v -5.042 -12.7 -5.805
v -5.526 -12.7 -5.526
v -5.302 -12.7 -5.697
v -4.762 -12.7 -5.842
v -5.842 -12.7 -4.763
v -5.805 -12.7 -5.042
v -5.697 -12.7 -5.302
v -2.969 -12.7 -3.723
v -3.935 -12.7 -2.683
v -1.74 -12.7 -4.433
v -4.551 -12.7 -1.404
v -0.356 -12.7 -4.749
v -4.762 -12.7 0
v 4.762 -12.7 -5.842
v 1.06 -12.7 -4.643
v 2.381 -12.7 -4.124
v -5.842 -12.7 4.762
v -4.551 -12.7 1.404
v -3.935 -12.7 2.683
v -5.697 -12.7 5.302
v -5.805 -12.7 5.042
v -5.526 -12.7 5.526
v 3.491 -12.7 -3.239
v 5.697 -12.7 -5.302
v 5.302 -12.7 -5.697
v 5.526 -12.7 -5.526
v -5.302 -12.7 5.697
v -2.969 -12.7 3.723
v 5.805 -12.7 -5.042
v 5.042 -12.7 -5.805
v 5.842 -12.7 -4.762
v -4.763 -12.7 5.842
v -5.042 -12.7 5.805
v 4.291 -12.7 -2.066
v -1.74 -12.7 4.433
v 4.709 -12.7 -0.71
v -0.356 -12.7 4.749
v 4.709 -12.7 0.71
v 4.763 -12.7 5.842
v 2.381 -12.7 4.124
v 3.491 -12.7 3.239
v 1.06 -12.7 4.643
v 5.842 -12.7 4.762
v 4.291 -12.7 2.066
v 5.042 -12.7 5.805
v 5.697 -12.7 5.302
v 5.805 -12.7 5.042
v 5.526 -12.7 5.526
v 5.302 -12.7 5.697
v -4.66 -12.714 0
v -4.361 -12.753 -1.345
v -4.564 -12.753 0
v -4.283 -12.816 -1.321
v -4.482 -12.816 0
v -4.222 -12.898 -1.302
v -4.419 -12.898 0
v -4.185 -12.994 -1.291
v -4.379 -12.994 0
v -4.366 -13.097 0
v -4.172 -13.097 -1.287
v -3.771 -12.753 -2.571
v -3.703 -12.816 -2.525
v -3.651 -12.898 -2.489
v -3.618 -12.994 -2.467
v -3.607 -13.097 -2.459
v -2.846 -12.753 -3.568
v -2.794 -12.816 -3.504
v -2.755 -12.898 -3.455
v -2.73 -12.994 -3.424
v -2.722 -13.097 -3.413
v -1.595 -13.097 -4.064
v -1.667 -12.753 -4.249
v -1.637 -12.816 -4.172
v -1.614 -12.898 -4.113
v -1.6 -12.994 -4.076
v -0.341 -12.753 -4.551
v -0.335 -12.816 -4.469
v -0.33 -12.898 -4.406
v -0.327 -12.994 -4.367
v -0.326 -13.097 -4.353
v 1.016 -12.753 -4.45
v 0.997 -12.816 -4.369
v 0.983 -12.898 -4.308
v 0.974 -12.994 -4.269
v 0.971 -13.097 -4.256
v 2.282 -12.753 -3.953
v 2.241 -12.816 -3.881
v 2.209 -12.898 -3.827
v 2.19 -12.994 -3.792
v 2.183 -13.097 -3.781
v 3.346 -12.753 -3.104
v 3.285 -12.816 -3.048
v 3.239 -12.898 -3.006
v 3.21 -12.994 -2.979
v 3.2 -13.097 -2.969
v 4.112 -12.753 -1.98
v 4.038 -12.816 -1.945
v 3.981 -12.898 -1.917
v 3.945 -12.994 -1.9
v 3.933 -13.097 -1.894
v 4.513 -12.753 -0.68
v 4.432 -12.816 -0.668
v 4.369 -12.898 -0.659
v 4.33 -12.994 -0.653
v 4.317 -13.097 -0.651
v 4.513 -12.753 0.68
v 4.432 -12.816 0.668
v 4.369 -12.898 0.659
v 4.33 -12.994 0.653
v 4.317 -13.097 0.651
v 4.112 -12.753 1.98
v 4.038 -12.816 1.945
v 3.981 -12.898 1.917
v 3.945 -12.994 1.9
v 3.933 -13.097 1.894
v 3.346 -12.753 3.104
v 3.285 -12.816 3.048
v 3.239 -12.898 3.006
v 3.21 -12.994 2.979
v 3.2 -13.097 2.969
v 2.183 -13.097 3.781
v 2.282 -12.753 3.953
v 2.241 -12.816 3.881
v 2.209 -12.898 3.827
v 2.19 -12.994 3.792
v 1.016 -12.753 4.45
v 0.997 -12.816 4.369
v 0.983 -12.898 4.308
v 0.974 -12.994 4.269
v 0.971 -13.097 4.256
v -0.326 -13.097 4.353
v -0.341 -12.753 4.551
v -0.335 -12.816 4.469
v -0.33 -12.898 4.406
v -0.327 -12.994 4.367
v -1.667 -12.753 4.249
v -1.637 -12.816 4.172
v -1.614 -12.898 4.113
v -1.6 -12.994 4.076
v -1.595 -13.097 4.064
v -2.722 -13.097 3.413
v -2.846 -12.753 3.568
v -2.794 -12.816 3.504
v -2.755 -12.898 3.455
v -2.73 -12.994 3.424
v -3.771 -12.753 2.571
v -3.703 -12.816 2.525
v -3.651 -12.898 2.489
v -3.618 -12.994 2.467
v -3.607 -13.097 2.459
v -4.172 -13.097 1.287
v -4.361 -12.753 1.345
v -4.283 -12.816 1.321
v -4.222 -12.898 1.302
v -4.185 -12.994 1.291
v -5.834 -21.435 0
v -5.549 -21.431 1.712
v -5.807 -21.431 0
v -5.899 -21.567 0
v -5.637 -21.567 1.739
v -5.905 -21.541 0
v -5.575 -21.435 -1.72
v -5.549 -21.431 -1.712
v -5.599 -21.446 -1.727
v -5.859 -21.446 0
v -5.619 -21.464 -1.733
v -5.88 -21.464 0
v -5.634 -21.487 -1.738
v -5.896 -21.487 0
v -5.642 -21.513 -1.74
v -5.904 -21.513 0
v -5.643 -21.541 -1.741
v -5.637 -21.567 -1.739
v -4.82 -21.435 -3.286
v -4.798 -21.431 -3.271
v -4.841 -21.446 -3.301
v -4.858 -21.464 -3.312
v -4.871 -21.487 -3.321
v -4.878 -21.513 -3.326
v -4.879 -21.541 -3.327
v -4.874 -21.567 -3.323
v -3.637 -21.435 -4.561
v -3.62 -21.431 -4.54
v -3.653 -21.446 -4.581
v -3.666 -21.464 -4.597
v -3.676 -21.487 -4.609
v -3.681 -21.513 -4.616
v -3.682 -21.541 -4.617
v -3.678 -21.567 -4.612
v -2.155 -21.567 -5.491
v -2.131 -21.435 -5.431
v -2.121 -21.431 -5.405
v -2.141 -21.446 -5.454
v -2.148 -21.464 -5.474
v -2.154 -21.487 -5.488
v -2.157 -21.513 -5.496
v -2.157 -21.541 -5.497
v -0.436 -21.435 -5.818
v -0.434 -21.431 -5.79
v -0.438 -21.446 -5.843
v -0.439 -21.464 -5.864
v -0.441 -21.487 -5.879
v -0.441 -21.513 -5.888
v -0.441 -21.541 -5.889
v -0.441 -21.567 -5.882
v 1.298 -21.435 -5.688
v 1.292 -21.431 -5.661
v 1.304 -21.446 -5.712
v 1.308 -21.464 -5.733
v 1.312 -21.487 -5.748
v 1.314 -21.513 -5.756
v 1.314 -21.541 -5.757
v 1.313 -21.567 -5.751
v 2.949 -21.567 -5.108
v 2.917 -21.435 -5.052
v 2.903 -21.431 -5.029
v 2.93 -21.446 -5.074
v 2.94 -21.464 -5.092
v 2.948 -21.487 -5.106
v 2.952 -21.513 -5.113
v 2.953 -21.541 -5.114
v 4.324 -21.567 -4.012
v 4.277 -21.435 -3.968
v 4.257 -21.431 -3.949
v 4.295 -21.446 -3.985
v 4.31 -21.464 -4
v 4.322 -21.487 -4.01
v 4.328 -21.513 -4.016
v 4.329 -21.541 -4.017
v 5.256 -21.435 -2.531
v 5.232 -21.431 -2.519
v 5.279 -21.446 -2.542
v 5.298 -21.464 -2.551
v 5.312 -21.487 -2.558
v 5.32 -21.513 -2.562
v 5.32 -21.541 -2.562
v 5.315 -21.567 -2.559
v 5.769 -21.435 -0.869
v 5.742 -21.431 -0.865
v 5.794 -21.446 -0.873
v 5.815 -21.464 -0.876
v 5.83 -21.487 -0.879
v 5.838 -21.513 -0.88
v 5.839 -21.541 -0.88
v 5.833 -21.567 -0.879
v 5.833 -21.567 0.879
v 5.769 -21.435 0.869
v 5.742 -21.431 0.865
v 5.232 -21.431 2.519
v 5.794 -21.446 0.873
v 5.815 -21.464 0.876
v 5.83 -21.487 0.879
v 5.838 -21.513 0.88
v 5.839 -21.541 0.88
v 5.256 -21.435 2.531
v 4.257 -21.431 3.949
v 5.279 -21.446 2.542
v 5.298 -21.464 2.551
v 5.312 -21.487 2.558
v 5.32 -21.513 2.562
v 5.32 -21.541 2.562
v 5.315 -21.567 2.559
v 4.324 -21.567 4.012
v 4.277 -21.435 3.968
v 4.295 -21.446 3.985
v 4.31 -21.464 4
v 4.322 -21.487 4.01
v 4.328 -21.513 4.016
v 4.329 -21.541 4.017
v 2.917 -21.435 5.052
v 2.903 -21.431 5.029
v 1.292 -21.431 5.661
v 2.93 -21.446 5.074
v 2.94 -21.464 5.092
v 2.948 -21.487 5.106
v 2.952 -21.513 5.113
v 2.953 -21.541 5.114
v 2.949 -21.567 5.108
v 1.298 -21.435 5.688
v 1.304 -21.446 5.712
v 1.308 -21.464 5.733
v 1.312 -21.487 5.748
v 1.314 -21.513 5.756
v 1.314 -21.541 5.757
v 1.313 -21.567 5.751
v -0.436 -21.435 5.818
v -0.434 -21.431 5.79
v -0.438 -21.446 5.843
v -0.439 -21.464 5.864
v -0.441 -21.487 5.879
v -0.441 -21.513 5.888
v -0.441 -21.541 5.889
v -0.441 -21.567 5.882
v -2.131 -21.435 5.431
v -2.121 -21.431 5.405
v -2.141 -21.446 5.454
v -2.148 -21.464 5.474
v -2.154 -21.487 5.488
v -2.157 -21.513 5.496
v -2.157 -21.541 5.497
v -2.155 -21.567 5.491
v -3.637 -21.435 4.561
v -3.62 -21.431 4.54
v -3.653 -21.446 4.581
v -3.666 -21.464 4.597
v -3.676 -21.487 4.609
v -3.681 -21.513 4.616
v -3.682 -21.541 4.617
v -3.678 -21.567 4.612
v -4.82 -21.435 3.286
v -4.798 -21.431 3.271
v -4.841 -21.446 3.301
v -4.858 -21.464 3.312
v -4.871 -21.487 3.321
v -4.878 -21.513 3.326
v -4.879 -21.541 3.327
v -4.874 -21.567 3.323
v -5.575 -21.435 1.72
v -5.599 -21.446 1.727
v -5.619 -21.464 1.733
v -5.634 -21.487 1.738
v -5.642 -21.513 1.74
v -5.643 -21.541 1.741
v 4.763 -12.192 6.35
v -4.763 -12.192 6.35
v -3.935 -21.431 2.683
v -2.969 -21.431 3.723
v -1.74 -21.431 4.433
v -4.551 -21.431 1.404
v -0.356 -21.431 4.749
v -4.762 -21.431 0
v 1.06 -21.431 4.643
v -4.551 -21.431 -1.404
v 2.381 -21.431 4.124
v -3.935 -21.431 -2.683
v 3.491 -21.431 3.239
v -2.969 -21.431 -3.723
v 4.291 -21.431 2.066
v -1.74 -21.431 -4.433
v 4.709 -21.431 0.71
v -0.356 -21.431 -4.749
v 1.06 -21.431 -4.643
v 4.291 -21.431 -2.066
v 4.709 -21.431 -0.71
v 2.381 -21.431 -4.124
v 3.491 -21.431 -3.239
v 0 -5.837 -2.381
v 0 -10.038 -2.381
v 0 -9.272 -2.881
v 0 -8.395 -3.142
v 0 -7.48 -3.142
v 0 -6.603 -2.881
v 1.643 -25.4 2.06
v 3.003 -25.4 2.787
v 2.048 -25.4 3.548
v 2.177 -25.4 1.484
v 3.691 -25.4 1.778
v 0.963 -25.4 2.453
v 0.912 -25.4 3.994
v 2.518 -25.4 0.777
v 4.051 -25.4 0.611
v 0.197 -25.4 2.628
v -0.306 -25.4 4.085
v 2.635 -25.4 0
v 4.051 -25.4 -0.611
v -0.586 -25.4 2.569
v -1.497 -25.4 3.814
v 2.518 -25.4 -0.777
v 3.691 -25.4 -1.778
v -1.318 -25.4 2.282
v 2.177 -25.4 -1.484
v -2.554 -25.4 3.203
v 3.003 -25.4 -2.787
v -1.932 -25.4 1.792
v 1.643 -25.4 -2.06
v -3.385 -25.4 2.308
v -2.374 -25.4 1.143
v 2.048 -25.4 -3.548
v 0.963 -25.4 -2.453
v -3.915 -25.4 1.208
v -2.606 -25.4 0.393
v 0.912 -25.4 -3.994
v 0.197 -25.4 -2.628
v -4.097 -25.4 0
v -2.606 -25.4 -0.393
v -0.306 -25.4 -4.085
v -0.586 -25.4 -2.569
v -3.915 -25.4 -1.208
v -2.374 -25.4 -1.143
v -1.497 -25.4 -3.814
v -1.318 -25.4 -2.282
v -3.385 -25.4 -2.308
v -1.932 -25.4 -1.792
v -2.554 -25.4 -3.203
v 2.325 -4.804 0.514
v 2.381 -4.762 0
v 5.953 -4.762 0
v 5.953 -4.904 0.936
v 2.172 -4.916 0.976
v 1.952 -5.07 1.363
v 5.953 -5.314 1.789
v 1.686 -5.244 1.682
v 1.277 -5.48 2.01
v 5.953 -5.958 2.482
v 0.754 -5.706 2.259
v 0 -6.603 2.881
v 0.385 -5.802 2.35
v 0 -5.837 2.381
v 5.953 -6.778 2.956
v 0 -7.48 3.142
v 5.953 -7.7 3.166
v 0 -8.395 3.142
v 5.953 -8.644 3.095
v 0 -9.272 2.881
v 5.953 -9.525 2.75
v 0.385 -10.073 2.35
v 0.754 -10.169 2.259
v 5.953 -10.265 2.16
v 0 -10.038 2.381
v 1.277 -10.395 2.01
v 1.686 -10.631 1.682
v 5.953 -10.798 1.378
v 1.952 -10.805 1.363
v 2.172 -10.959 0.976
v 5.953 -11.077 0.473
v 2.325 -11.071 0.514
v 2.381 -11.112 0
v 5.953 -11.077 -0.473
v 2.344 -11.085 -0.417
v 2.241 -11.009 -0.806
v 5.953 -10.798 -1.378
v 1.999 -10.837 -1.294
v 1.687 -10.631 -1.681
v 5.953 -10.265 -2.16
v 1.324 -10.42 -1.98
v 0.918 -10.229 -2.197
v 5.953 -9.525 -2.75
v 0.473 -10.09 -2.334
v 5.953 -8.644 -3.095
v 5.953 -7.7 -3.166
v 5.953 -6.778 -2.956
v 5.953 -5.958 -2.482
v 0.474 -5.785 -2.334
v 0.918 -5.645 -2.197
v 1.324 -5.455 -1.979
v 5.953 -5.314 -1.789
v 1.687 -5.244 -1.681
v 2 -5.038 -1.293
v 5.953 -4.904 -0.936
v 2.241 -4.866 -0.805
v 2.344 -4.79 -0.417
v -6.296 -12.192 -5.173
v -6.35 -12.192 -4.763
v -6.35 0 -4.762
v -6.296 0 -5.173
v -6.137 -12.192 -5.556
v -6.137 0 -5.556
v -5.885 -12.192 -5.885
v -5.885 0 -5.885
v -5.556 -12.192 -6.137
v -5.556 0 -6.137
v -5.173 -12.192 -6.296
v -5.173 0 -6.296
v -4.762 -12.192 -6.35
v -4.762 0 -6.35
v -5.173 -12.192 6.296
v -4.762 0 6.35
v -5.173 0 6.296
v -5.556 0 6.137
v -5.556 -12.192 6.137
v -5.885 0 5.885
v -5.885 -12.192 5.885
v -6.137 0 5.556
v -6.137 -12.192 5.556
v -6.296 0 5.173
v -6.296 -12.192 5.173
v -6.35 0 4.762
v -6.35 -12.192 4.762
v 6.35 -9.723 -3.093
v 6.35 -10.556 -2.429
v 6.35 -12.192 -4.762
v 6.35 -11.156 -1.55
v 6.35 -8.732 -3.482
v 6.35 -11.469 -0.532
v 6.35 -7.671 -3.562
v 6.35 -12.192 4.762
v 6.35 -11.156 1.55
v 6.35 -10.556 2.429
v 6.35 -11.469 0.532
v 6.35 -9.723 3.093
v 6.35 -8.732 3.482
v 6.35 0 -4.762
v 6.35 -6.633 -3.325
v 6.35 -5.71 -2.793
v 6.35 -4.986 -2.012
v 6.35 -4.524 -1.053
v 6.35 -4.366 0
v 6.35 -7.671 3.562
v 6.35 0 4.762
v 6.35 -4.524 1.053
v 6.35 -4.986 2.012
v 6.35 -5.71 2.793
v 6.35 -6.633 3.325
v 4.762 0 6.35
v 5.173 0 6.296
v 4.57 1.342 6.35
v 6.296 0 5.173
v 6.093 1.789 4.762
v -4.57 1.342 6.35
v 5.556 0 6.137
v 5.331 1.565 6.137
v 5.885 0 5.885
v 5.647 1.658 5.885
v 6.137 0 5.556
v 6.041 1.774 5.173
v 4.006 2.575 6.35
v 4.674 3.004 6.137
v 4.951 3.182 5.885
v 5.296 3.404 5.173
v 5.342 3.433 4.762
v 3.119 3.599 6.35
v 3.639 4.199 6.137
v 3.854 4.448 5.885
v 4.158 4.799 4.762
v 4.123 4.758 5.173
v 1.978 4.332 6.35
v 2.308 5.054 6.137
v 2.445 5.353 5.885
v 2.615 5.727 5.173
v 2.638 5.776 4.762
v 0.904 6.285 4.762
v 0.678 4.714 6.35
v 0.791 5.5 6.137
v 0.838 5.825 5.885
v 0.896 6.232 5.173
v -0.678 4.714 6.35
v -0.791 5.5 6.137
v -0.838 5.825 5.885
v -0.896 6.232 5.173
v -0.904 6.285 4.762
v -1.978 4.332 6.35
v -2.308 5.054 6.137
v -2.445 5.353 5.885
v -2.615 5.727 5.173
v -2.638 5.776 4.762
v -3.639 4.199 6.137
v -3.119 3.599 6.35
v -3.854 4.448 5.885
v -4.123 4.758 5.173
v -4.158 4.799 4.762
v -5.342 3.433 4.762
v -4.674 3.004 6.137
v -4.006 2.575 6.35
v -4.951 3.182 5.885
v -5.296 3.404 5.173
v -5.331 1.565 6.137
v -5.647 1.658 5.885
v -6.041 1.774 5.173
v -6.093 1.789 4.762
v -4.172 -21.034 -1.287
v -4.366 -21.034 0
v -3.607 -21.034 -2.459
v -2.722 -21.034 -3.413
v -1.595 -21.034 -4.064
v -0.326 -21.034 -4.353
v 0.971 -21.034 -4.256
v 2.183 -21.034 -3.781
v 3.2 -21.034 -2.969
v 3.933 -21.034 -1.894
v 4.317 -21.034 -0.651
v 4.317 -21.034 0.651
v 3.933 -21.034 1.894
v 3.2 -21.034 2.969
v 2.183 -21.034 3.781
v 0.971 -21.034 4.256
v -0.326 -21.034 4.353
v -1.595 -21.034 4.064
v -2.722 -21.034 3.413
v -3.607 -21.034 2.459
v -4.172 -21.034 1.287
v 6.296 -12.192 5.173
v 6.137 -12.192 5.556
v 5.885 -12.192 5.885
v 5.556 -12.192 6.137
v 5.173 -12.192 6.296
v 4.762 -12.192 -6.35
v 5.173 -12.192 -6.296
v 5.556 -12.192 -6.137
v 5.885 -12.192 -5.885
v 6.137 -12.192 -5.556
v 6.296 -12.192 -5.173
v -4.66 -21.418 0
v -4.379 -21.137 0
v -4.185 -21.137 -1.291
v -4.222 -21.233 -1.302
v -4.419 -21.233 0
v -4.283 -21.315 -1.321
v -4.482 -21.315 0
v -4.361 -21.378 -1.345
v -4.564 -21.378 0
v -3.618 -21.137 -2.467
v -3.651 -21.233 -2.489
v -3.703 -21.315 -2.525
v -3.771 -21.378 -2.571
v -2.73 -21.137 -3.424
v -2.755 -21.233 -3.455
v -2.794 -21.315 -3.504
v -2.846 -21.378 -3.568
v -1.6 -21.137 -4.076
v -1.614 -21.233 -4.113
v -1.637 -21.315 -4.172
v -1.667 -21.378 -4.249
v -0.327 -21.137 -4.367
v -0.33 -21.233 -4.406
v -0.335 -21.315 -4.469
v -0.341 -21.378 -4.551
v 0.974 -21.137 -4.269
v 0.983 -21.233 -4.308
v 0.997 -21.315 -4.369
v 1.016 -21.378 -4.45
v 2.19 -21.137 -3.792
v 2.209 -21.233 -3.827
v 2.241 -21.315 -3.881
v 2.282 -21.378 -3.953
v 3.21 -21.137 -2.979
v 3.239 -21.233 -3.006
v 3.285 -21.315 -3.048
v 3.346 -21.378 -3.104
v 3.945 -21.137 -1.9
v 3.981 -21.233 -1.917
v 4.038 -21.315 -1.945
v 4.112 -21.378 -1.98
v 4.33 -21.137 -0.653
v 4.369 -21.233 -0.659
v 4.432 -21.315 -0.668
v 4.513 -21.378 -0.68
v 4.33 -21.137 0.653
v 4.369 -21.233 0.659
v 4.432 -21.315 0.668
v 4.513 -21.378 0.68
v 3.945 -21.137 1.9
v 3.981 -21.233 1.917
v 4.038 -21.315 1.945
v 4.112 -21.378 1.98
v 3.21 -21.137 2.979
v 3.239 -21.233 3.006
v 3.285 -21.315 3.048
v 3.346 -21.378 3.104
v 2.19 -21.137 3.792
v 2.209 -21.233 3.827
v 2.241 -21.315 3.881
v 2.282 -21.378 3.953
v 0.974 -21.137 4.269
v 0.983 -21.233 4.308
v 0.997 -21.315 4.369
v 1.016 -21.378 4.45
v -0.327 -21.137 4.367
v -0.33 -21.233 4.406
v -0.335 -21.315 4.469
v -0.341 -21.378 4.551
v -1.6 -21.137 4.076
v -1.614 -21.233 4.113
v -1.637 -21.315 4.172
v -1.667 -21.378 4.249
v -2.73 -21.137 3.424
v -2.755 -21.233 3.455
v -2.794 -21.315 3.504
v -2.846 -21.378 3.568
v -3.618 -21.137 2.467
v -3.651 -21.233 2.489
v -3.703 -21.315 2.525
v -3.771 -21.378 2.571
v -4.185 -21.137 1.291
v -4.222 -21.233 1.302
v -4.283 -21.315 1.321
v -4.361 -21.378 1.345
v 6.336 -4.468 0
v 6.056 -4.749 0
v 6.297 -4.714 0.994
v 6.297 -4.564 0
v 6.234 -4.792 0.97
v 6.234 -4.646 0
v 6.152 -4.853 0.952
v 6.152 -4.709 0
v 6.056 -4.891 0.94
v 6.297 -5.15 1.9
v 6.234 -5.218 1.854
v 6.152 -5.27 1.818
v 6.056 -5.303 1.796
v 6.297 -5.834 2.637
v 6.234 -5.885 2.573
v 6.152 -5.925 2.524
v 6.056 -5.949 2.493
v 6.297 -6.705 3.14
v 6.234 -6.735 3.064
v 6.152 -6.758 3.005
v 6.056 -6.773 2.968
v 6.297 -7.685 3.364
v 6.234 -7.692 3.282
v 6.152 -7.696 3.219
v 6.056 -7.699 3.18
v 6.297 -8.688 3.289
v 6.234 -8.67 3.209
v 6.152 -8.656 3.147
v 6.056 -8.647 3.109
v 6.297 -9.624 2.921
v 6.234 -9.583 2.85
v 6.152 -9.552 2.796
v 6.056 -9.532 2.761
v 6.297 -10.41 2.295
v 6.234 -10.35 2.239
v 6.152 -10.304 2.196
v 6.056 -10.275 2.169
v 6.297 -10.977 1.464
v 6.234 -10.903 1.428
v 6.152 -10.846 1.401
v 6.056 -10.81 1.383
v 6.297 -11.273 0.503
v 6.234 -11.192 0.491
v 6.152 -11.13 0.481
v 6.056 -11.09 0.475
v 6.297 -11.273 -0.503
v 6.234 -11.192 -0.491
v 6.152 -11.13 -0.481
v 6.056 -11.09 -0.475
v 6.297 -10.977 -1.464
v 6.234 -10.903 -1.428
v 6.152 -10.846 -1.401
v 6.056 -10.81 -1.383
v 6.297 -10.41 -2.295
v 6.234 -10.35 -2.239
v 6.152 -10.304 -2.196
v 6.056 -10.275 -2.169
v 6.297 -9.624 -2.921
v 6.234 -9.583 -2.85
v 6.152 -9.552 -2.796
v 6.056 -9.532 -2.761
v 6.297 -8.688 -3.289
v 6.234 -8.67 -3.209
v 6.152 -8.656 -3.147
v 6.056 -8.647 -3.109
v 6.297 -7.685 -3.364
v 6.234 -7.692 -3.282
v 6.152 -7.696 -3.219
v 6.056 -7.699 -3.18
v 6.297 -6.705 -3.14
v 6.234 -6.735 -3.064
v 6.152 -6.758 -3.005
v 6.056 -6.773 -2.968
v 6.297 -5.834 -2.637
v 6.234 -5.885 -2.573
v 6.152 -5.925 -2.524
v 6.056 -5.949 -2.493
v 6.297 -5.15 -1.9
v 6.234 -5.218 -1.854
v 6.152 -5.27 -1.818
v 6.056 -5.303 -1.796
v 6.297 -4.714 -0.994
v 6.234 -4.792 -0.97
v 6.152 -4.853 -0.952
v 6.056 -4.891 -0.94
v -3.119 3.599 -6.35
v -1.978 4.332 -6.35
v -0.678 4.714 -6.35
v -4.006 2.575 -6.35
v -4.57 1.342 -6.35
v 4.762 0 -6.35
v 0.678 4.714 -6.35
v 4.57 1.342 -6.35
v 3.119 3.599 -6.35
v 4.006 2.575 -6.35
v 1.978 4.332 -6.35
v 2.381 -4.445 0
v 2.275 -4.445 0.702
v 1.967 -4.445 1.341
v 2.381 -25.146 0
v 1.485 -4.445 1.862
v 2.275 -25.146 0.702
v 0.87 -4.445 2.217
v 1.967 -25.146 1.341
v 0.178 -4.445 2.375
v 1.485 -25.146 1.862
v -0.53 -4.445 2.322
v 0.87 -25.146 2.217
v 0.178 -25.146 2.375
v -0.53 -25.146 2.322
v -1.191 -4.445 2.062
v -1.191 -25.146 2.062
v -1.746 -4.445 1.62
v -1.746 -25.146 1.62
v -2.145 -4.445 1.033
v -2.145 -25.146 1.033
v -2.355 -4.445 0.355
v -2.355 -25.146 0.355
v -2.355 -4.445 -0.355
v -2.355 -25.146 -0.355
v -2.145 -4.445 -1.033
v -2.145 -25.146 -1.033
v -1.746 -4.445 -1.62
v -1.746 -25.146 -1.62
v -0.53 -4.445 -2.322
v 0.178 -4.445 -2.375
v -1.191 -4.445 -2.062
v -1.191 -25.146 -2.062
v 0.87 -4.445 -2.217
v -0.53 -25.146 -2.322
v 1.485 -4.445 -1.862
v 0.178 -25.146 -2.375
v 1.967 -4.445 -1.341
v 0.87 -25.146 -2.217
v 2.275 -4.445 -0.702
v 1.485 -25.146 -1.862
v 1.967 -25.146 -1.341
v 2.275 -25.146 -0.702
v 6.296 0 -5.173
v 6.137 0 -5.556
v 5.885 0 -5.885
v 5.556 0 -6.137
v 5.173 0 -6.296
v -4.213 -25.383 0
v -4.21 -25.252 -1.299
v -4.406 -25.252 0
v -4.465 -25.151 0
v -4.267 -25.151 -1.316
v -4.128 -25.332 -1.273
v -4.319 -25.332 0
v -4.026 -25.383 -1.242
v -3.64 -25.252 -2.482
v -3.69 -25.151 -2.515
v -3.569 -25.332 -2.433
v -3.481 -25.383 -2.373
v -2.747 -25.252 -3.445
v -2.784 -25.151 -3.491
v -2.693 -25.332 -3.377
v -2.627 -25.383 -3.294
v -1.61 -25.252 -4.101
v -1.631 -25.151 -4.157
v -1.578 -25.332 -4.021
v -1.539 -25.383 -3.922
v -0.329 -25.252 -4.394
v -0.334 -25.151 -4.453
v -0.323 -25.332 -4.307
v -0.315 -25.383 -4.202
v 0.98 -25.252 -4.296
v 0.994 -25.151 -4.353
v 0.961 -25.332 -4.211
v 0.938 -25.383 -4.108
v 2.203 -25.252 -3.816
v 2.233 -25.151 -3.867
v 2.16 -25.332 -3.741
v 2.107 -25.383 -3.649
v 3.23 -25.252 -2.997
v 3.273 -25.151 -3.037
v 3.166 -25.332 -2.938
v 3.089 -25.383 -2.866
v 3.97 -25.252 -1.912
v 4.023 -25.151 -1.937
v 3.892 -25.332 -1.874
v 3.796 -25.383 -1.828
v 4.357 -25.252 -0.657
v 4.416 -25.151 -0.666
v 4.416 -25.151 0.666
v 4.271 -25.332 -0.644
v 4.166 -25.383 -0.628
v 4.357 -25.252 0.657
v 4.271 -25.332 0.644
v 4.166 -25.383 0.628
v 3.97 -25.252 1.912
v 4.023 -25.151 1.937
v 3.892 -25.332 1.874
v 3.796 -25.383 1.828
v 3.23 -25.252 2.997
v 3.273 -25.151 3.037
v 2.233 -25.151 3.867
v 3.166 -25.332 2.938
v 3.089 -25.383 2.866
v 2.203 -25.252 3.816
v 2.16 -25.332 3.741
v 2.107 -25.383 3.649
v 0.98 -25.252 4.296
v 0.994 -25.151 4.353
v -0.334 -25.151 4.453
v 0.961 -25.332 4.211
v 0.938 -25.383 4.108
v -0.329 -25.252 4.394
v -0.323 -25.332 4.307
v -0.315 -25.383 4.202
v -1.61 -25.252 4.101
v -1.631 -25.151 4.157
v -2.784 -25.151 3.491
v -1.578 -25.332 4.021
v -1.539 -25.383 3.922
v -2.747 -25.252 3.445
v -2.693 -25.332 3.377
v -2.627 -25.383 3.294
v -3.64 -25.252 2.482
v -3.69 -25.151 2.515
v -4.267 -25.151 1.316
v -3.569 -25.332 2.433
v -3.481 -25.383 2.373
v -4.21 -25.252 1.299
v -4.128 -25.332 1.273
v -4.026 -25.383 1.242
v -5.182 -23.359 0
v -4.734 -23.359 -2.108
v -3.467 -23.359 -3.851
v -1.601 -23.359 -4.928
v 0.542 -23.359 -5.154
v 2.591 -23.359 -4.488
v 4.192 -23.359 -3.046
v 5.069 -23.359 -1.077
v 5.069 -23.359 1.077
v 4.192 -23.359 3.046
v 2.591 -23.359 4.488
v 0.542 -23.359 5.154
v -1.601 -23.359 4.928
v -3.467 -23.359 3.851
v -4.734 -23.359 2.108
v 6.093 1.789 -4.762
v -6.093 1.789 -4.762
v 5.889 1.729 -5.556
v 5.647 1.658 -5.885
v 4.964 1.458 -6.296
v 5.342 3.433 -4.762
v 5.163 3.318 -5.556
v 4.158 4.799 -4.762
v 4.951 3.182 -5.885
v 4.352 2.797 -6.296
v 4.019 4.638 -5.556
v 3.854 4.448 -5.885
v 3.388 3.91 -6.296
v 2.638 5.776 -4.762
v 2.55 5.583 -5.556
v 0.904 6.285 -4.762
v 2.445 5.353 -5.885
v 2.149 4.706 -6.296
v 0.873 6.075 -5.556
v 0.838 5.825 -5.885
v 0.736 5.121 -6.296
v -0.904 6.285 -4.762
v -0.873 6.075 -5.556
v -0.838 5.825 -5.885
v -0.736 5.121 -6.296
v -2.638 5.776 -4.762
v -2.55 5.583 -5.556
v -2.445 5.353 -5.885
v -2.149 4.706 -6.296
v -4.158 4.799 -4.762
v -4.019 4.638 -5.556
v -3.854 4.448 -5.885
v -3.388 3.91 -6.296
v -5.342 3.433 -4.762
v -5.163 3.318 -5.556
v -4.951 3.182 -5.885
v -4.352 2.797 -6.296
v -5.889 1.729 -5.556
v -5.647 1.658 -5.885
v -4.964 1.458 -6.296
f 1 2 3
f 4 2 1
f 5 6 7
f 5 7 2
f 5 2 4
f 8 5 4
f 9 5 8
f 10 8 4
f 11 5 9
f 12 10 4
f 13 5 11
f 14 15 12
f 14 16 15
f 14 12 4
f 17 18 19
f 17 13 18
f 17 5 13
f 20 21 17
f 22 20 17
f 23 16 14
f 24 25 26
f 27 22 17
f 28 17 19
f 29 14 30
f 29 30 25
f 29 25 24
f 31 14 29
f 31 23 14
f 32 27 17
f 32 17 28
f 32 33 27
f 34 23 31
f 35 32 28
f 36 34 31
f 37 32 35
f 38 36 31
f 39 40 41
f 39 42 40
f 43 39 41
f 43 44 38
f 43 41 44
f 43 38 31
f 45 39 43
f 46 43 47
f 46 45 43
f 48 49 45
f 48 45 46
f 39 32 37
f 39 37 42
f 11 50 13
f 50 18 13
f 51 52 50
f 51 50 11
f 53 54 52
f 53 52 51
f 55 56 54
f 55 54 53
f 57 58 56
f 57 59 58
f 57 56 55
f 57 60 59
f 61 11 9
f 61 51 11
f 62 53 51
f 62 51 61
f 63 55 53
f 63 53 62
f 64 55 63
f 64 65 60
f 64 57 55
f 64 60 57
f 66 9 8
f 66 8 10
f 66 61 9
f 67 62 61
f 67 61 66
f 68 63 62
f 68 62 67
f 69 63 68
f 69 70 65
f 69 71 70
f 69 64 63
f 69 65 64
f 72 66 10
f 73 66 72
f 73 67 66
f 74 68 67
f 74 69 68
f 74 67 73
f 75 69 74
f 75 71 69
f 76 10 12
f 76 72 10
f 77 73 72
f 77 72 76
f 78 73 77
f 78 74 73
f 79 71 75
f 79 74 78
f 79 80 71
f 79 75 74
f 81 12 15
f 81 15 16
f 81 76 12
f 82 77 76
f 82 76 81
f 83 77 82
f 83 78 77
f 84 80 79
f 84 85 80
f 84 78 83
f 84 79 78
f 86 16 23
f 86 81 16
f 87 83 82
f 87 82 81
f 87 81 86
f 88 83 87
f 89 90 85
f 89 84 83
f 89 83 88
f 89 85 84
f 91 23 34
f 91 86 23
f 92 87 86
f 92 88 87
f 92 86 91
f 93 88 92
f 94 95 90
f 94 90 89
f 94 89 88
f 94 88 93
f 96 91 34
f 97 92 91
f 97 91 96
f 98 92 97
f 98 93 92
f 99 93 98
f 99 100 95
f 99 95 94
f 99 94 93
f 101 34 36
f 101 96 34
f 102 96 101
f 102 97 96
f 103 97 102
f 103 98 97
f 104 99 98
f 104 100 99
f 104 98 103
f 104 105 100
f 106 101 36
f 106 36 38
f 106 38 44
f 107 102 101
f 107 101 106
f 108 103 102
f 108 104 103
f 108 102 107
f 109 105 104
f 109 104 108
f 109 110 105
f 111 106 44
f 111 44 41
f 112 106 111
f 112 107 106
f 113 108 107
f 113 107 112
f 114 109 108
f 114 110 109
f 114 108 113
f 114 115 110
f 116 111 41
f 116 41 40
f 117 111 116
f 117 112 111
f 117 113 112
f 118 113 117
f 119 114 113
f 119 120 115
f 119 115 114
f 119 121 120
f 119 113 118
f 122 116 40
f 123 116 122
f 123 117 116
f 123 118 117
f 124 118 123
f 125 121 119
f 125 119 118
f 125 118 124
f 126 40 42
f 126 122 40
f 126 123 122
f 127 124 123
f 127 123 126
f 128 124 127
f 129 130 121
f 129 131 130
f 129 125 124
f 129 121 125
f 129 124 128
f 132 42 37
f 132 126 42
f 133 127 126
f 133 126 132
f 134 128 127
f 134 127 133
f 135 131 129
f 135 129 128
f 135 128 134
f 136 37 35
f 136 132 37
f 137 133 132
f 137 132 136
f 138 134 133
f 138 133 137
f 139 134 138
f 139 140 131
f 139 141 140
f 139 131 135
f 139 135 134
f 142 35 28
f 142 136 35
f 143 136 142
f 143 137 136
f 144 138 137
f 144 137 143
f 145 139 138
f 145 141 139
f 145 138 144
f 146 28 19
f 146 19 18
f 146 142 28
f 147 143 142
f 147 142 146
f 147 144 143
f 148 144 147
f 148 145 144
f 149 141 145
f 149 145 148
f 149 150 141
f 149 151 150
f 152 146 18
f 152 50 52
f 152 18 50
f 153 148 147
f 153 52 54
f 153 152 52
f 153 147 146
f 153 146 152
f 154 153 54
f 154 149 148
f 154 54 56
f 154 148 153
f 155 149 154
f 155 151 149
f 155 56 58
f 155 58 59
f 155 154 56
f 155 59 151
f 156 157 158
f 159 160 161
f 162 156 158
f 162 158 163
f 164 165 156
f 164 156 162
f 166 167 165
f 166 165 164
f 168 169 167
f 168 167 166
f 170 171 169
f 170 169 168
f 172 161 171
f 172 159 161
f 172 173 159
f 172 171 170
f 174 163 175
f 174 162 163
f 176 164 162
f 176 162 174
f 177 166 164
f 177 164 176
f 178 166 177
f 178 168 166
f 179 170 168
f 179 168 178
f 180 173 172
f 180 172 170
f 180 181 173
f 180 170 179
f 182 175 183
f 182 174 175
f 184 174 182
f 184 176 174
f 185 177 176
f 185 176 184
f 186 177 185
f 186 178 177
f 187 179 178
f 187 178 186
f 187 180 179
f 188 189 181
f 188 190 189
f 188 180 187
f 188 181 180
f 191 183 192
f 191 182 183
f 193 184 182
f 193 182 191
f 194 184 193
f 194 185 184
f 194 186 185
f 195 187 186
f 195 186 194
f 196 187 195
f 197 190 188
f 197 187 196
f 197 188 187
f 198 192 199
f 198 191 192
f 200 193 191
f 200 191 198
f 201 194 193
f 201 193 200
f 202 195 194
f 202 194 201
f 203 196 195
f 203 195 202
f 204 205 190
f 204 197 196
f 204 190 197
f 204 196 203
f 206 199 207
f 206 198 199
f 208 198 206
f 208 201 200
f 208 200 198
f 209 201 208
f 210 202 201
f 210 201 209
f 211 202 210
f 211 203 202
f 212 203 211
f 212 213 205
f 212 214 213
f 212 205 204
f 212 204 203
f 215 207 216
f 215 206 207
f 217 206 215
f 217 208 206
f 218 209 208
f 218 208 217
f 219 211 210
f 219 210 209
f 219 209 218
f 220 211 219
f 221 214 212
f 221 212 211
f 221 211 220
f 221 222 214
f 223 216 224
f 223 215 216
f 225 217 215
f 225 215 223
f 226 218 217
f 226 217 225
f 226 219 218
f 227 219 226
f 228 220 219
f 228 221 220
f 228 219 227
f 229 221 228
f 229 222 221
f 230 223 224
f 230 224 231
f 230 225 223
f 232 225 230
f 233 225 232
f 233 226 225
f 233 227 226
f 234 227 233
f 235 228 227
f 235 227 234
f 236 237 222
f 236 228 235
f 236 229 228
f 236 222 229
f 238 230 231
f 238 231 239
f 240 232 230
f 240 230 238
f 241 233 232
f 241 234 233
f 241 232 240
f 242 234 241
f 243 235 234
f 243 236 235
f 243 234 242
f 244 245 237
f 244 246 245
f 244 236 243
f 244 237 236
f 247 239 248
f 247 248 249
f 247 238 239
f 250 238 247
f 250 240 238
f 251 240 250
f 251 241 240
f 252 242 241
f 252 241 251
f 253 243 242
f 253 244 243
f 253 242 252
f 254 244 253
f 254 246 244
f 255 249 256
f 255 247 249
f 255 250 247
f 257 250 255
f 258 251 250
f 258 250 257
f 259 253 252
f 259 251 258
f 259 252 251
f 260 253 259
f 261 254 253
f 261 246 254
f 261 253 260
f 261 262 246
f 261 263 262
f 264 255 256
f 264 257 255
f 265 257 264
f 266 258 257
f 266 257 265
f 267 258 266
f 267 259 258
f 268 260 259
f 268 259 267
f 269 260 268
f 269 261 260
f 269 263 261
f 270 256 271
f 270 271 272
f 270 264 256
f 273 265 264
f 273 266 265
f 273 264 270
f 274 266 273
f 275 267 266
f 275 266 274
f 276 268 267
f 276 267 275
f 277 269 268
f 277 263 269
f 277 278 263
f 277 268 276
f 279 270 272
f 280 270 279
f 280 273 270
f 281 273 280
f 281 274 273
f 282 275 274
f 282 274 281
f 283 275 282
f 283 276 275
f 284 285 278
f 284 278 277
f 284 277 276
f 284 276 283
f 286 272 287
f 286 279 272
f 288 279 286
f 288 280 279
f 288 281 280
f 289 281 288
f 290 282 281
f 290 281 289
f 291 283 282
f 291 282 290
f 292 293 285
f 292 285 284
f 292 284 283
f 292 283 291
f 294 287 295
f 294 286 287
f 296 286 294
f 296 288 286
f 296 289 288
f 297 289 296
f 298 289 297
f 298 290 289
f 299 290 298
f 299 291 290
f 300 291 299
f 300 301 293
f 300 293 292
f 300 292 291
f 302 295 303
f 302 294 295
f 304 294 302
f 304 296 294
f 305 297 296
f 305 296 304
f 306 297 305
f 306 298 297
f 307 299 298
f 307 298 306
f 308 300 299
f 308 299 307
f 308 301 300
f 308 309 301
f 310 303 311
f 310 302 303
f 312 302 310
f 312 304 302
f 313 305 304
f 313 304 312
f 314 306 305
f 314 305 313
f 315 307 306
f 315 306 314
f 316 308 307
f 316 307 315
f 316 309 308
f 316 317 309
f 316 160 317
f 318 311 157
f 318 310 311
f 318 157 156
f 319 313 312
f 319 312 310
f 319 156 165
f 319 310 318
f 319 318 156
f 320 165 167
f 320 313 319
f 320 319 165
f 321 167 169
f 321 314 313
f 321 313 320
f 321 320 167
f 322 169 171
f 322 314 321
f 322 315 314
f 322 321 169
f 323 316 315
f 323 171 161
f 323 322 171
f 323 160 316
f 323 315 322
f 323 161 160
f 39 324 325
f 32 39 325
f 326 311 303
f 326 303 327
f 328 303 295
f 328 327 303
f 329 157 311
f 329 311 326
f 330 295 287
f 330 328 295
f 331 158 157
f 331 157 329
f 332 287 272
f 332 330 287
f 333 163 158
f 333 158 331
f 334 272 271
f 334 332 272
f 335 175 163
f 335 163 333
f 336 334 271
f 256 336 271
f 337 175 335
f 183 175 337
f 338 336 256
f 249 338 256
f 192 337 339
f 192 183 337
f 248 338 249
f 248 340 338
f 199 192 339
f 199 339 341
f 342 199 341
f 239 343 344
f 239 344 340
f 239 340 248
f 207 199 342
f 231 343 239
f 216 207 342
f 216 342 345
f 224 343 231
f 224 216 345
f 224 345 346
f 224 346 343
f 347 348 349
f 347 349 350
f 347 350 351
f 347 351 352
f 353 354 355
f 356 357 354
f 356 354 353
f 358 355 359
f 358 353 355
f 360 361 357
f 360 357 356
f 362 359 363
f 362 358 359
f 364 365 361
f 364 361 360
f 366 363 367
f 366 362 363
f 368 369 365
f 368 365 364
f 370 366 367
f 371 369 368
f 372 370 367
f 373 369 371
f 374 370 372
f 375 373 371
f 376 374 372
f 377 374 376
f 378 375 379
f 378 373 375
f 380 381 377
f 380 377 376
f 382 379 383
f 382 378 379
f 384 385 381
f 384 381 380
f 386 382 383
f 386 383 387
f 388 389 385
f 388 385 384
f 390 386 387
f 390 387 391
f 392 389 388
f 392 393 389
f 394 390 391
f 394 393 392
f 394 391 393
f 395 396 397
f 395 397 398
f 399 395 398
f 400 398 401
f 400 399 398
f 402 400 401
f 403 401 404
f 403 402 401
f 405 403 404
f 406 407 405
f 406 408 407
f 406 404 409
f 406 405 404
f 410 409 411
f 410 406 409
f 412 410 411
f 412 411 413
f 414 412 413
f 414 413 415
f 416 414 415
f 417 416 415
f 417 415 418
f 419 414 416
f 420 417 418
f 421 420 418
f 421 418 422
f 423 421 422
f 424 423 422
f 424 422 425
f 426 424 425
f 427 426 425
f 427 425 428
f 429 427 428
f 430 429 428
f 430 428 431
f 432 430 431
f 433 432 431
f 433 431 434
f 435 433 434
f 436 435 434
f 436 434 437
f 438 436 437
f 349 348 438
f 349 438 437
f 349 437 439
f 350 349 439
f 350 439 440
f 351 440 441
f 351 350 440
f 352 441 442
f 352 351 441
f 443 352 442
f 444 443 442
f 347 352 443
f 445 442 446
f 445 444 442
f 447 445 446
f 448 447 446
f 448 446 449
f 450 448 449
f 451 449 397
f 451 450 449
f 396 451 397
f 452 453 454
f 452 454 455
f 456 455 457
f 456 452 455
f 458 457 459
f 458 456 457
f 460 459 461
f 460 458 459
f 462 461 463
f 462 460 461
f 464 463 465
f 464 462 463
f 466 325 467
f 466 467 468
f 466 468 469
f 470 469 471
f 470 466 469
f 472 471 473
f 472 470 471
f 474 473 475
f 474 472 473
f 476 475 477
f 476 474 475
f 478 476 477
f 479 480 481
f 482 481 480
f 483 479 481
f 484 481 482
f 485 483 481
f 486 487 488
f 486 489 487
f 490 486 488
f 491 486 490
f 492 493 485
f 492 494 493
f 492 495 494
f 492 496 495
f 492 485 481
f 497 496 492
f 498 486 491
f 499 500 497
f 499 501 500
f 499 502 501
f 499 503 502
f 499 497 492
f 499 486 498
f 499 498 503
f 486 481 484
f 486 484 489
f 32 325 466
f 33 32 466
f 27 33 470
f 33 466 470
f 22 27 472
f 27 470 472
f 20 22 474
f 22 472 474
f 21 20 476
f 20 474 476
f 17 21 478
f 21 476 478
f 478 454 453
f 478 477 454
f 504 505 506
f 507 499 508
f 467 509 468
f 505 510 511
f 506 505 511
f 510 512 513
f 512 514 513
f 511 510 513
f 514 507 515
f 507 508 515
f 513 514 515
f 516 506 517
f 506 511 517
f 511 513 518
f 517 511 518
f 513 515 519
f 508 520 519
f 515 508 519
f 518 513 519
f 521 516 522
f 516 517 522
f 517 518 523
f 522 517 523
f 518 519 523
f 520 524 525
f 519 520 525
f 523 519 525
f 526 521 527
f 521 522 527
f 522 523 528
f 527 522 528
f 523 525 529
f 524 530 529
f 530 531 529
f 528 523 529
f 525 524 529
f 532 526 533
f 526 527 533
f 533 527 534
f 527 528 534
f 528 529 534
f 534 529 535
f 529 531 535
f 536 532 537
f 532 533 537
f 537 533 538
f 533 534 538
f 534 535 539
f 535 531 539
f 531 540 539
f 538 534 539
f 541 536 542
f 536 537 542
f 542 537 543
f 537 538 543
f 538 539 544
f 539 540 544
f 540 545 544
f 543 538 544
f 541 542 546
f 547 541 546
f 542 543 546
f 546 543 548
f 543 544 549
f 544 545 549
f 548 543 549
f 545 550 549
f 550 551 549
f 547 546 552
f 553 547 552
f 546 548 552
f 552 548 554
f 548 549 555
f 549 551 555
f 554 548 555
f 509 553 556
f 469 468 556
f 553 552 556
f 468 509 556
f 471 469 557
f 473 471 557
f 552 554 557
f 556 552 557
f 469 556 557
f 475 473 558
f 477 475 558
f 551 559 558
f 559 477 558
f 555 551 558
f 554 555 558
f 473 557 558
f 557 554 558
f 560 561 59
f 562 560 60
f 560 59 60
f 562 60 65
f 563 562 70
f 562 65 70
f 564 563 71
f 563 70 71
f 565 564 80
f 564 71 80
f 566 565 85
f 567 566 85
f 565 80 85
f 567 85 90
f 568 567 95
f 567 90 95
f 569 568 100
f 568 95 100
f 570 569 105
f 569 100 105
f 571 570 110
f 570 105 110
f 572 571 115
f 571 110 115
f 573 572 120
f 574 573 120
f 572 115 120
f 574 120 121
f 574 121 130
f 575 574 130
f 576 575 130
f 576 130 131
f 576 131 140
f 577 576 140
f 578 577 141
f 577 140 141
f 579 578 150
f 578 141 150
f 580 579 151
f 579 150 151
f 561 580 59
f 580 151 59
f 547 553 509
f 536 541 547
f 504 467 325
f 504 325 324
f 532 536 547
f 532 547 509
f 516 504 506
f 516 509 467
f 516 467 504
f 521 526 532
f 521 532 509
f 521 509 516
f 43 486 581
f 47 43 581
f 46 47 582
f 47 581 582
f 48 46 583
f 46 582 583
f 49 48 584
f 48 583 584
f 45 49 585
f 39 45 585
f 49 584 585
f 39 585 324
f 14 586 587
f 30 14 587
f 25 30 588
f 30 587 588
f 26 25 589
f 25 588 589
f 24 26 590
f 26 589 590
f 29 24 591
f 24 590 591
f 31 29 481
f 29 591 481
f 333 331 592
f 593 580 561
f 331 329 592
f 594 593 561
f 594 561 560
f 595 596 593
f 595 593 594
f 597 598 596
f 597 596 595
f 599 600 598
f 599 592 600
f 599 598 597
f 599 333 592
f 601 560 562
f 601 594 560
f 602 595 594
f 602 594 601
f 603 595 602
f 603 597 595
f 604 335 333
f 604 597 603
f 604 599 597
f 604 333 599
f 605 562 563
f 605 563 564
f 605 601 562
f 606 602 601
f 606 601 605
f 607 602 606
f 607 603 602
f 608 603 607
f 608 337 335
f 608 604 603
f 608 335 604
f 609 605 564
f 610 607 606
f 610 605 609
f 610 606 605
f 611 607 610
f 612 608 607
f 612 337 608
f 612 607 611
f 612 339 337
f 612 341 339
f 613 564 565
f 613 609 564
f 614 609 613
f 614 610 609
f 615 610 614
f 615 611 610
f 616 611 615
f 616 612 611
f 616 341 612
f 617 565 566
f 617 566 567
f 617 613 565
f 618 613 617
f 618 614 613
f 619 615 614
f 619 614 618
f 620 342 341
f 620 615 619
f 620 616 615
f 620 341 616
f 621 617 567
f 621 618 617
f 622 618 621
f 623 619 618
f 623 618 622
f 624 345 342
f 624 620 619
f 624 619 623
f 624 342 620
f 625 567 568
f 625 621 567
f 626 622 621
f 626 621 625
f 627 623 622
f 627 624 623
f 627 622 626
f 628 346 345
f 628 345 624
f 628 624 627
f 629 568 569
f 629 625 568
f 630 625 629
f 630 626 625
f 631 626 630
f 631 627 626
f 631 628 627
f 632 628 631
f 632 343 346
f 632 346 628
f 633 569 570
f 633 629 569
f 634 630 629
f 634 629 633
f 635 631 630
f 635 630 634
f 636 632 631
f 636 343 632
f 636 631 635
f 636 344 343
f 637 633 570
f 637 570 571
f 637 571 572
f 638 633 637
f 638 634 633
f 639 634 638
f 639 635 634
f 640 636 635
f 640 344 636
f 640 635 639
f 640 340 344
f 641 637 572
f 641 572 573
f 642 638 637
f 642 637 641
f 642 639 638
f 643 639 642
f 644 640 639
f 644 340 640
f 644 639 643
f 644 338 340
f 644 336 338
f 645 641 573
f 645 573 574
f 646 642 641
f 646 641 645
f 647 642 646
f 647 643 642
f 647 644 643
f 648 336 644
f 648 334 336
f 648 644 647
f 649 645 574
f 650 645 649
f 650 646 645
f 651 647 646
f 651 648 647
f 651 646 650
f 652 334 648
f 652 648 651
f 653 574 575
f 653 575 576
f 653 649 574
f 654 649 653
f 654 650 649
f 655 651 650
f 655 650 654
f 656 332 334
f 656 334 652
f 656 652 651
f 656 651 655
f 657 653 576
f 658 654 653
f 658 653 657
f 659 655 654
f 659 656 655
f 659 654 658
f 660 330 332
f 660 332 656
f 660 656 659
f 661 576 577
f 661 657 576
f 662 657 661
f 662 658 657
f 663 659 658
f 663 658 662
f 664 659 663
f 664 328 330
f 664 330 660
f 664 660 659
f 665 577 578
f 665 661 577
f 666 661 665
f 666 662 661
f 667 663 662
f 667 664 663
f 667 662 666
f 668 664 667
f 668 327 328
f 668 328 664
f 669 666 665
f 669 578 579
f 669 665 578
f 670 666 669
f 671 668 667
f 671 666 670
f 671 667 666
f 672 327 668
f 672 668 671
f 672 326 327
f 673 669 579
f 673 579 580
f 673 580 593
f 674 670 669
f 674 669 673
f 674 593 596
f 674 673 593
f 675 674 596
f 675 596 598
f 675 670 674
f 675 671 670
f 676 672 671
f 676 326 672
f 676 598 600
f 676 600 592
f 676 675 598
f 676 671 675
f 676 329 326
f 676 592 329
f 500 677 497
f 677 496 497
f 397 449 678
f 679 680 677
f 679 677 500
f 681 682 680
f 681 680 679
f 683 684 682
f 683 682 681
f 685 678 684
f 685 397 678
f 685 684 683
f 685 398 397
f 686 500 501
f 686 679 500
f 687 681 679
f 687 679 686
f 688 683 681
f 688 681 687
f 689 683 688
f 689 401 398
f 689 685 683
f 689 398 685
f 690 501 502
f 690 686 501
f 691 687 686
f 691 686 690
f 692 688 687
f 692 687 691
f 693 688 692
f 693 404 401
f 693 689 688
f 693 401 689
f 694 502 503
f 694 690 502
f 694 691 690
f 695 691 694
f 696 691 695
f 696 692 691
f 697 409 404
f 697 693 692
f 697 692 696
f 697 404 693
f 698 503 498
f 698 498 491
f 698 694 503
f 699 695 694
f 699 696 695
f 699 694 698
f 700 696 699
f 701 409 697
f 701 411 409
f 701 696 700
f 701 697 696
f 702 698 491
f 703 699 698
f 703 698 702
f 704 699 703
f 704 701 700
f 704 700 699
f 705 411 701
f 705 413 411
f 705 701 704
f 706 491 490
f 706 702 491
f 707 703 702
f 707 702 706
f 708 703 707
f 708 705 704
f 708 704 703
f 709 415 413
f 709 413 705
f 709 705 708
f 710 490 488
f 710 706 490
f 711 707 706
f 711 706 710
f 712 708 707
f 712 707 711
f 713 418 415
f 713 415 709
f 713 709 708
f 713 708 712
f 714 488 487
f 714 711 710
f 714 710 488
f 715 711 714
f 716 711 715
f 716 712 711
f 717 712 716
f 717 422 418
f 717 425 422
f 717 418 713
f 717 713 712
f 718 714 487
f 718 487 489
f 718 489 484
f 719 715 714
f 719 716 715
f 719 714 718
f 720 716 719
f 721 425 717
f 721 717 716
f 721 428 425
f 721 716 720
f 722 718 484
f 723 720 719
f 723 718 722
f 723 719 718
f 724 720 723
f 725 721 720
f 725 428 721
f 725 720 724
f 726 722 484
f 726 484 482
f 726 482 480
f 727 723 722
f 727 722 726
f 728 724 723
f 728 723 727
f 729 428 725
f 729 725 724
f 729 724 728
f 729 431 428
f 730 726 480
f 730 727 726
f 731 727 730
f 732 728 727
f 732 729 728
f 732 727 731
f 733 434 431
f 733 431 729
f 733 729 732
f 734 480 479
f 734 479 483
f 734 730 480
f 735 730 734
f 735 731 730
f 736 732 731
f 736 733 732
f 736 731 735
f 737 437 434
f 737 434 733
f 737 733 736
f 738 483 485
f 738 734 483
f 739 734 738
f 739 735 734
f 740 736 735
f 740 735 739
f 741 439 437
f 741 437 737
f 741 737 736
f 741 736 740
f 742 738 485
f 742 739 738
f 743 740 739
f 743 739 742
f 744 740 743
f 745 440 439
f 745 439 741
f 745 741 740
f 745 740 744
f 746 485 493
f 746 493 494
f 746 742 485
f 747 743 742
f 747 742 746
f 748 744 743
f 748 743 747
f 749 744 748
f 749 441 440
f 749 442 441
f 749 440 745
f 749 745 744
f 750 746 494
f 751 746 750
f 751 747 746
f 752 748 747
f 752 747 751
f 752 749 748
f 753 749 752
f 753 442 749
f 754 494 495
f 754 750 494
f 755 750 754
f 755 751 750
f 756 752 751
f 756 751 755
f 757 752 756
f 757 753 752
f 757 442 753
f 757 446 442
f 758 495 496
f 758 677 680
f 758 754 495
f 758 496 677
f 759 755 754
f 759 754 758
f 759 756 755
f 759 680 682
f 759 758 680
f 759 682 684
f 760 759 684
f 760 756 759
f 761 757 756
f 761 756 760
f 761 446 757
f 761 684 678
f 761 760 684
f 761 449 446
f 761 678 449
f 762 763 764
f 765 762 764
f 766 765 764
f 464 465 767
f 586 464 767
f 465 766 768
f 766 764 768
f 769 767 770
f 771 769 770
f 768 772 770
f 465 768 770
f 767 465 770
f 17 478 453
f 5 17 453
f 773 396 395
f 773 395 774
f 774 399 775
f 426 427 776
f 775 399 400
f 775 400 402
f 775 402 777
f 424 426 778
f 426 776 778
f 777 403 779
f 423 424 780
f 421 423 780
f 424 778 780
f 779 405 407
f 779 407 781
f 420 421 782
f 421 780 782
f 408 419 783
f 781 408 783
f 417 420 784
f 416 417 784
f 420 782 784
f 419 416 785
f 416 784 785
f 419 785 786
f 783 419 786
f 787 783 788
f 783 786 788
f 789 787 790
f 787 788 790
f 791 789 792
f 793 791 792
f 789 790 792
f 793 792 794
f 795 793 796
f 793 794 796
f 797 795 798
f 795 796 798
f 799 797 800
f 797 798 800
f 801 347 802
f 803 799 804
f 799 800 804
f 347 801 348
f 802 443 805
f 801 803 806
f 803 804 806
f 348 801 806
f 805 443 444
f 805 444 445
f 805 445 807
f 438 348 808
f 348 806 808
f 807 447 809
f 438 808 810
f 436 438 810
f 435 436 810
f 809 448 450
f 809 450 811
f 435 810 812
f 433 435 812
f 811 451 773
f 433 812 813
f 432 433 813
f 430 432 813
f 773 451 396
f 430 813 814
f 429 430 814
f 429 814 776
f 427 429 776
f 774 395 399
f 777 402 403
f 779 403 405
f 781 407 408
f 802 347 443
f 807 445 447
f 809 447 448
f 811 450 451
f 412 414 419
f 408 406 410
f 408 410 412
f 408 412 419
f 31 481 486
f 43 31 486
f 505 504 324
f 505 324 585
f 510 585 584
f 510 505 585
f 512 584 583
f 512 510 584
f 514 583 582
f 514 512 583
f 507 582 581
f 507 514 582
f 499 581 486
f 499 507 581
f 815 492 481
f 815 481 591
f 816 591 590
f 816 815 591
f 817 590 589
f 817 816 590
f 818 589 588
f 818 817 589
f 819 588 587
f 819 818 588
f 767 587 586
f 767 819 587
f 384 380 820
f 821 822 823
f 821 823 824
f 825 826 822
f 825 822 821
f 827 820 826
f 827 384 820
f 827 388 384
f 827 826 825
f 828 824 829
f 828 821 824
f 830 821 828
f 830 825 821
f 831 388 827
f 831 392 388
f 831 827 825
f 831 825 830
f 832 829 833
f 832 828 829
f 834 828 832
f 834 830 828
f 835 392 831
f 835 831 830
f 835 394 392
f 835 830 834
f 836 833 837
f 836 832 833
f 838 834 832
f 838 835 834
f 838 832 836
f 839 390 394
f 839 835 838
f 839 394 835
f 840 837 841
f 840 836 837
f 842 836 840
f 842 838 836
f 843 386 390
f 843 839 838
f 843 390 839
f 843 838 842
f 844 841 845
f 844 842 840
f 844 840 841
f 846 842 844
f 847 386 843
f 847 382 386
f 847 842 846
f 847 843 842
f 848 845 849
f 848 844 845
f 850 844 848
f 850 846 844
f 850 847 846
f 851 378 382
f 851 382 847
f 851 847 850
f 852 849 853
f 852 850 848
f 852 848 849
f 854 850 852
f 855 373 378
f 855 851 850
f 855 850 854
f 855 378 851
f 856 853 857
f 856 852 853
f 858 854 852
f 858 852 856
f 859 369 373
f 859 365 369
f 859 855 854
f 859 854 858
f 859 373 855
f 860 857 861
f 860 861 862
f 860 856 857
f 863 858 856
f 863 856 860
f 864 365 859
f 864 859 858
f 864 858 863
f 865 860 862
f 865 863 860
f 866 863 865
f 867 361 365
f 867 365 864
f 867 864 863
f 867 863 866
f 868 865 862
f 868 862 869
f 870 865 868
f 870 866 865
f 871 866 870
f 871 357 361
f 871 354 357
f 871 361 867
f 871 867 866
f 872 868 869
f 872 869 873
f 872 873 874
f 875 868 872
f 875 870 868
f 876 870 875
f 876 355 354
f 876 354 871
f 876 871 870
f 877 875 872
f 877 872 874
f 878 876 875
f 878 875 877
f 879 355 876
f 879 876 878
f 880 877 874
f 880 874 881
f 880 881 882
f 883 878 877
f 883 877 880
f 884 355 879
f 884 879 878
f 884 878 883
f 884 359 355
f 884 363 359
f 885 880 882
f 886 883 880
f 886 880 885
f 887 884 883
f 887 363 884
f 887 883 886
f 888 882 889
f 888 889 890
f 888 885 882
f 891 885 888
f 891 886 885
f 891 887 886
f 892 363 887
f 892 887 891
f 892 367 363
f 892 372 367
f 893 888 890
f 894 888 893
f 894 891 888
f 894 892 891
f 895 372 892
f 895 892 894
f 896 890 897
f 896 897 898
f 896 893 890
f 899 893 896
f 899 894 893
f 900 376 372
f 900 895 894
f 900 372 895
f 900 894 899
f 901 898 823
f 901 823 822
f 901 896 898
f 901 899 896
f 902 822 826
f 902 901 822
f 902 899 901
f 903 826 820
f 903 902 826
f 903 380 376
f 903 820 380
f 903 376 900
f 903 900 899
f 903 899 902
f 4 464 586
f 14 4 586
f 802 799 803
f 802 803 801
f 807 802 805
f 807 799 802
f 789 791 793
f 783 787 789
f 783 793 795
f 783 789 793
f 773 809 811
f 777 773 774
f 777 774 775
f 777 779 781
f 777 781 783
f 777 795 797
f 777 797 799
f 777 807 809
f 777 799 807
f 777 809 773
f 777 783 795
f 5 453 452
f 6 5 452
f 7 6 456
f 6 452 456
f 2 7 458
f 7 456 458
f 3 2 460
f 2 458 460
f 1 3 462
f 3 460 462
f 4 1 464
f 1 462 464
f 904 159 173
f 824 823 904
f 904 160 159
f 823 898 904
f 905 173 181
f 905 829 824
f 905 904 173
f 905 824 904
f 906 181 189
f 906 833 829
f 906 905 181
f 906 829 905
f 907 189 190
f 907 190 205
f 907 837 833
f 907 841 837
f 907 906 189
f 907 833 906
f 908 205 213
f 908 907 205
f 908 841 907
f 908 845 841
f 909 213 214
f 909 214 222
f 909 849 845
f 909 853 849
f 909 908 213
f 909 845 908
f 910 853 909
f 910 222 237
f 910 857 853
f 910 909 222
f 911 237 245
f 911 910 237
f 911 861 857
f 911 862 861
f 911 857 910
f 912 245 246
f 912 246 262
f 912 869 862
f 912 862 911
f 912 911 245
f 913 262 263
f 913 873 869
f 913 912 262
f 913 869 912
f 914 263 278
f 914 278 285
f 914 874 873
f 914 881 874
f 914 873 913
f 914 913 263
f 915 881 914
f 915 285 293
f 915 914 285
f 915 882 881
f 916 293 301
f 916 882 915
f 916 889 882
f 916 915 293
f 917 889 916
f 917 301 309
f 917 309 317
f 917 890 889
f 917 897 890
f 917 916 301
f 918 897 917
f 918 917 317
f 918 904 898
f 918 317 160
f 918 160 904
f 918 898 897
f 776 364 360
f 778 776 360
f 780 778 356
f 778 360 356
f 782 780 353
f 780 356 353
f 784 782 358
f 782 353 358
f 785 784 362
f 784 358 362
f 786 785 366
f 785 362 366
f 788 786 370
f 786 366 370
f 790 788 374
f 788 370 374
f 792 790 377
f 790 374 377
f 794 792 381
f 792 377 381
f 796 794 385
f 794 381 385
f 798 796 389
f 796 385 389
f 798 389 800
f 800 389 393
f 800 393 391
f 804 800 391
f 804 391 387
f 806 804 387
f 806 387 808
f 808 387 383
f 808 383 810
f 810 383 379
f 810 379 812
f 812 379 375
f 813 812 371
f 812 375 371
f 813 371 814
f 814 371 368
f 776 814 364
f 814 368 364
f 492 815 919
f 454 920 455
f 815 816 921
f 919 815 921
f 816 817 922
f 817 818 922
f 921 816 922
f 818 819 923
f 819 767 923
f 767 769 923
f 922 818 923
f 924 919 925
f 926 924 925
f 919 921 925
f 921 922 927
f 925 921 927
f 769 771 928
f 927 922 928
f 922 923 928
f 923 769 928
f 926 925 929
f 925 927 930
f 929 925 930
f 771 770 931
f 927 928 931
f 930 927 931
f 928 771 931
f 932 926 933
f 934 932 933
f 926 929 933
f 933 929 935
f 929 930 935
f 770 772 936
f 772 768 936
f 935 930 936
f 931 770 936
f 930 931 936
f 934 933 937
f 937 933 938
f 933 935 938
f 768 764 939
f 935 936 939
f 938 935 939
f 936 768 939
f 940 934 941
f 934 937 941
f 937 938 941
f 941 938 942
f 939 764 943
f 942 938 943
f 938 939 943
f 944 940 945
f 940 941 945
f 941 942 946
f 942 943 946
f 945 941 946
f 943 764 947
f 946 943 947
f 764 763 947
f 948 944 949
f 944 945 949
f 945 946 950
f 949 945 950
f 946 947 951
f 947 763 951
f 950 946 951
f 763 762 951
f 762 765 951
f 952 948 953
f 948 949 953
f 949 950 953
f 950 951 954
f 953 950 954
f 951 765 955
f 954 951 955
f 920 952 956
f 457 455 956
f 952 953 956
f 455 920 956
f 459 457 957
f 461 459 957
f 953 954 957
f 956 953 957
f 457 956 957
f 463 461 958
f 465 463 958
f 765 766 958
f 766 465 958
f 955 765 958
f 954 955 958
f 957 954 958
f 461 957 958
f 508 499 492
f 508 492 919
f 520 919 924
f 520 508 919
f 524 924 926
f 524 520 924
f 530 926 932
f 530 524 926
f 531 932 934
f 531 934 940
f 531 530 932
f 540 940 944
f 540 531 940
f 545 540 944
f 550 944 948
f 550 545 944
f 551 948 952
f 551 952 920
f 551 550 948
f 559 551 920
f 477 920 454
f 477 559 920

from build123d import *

# Parameters (mm, degrees)
BOSS_EXTRUDE1_DEPTH                        = 6.35
SKETCH3_R                                  = 2.38125
CUT_EXTRUDE1_DEPTH                         = 20.955
CBORE_FOR_1_4_SOCKET_SHOULDER_SCREW1_OUT_R = 3.175
CBORE_FOR_1_4_SOCKET_SHOULDER_SCREW1_DEPTH = 6.35
FILLET1_R                                  = 1.5875
FILLET2_R                                  = 0.396875
FILLET3_R                                  = 0.09921875
CHAMFER1_SIZE                              = 0.508
CHAMFER2_SIZE                              = 0.254


# Read off the part's stored shape, not the designer's step: CBORE for 1/4 Socket Shoulder Screw1
with BuildPart() as part:
    # Sketch1 → Boss-Extrude1 (new, symmetric)
    with BuildSketch(Plane.XY):
        with BuildLine():
            Line((-6.35, 0), (-6.35, -12.7))
            Line((-6.35, -12.7), (6.35, -12.7))
            Line((6.35, -12.7), (6.35, 0))
            ThreePointArc((6.35, 0), (0, 6.35), (-6.35, 0))
        make_face()
    extrude(amount=BOSS_EXTRUDE1_DEPTH, both=True)

    # Sketch2 → Revolve1 (revolve)
    with BuildSketch(Plane.XY, mode=Mode.PRIVATE) as revolve1_sk:
        Polygon((0, -12.7), (4.365625, -12.7), (4.365625, -16.66875), (4.365625, -18.25625), (4.365625, -21.43125), (5.953125, -21.43125), (4.365625, -25.4), (0, -25.4), align=None)
    revolve(revolve1_sk.sketch.rotate(Axis((0, 9.54404991, 0), (0, -1, 0)), 180), axis=Axis((0, 9.54404991, 0), (0, -1, 0)))

    # Sketch3 → Cut-Extrude1 (cut)
    with BuildSketch(Plane.XZ.offset(25.4)):
        Circle(SKETCH3_R)
    extrude(amount=-CUT_EXTRUDE1_DEPTH, mode=Mode.SUBTRACT)

    # CBORE for 1/4 Socket Shoulder Screw1 out → CBORE for 1/4 Socket Shoulder Screw1 (cut)
    with BuildSketch(Plane.YZ):
        with Locations((-7.9375, 0)):
            Circle(CBORE_FOR_1_4_SOCKET_SHOULDER_SCREW1_OUT_R)
    extrude(amount=CBORE_FOR_1_4_SOCKET_SHOULDER_SCREW1_DEPTH, mode=Mode.SUBTRACT)

    # Fillet1
    fillet1_edges = [part.edges().sort_by_distance(p)[0] for p in [
        (-6.35, -6.35, -6.35),
        (6.35, -6.35, -6.35),
        (0, 6.35, 6.35),
        (-6.35, -6.35, 6.35),
        (6.35, -6.35, 6.35),
        (0, 6.35, -6.35),
    ]]
    fillet(fillet1_edges, radius=FILLET1_R)

    # Fillet2
    fillet2_edges = [part.edges().sort_by_distance(p)[0] for p in [
        (4.365625, -12.7, 0),
        (4.365625, -21.43125, 0),
        (4.365625, -25.4, 0),
        (6.35, -11.1125, 0),
    ]]
    fillet(fillet2_edges, radius=FILLET2_R)

    # Fillet3
    fillet3_edges = [part.edges().sort_by_distance(p)[0] for p in [
        (5.953125, -21.43125, 0),
    ]]
    fillet(fillet3_edges, radius=FILLET3_R)

    # Chamfer1
    chamfer1_edges = [part.edges().sort_by_distance(p)[0] for p in [
        (6.35, -12.7, 0),
        (0, -12.7, -6.35),
        (0, -12.7, 6.35),
        (-6.35, -12.7, 0),
        (5.885032015, -12.7, 5.885032015),
        (-5.885032015, -12.7, 5.885032015),
        (-5.885032015, -12.7, -5.885032015),
        (5.885032015, -12.7, -5.885032015),
    ]]
    chamfer(chamfer1_edges, length=CHAMFER1_SIZE)

    # Chamfer2
    chamfer2_edges = [part.edges().sort_by_distance(p)[0] for p in [
        (-2.38125, -25.4, 0),
    ]]
    chamfer(chamfer2_edges, length=CHAMFER2_SIZE)


solid = part.part
